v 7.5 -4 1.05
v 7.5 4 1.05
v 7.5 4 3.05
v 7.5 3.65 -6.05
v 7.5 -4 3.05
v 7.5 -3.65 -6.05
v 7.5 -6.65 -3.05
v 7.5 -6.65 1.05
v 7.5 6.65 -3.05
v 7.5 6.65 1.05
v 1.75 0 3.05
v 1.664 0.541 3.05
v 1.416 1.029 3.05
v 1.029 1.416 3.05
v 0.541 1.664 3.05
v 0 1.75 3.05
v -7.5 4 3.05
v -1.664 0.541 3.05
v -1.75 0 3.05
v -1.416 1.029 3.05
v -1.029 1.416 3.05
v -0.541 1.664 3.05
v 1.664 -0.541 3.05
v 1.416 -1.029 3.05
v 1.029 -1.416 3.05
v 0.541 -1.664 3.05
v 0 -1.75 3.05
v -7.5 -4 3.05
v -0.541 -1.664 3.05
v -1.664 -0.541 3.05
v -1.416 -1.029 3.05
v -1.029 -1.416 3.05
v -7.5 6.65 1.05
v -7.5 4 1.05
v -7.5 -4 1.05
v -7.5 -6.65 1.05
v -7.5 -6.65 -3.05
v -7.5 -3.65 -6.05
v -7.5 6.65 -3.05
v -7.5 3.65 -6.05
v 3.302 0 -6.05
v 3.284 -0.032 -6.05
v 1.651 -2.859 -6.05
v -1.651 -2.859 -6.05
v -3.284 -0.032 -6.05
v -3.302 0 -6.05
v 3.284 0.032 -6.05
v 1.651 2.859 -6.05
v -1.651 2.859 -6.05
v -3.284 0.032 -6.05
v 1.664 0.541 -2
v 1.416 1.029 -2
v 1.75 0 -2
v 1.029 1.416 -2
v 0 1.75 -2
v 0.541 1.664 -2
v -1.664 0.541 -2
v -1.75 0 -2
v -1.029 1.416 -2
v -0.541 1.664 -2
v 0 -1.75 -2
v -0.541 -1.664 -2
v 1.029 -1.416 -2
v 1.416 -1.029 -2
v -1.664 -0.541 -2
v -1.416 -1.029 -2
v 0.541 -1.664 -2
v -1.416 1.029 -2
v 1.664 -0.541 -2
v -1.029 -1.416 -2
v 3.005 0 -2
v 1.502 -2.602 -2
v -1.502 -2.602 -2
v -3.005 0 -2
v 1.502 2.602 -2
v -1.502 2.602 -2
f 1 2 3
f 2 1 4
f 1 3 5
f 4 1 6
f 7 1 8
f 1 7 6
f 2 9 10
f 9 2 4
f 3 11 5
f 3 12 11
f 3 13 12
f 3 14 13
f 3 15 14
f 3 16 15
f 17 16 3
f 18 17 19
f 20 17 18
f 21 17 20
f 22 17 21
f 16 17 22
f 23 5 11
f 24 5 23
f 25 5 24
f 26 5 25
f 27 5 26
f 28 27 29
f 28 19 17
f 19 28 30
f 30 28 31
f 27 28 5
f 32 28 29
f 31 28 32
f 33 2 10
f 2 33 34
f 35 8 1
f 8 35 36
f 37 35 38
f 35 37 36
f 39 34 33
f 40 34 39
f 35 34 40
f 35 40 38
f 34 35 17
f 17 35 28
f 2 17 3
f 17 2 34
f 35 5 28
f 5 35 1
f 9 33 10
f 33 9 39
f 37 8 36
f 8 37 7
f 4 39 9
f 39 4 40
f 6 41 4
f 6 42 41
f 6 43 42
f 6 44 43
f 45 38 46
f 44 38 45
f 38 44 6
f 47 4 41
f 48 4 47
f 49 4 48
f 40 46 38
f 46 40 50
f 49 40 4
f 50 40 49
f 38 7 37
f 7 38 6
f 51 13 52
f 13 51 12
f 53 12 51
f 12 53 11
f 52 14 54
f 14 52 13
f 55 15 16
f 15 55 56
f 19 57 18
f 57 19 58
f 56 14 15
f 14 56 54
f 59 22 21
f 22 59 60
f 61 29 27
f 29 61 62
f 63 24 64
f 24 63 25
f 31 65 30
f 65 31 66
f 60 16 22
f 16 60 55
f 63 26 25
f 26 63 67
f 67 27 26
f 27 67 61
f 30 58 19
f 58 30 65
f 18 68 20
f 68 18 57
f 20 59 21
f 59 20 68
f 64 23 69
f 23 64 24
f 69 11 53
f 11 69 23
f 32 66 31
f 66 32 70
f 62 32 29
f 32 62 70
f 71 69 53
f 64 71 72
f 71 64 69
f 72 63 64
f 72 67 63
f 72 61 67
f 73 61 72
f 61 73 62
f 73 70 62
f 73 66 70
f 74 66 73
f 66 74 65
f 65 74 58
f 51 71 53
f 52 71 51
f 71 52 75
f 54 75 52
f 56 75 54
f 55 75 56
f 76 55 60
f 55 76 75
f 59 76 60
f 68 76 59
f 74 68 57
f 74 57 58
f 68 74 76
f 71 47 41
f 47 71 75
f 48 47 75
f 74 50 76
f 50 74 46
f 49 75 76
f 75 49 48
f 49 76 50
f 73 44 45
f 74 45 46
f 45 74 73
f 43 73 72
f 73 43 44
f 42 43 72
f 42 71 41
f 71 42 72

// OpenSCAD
nut_size = 6.01;
bolt_d = 3.5;
top_width = 8;
top_height = 2;//2
width = 13.3;//13.5
height = 9.1;//9.5
length = 15;
bottom_edge_cut = 3;
nut_depth = 4;



module trapezoid(width_base, width_top, height, thickness, center = true) {
  linear_extrude(height = thickness) polygon(points=[[0,0],[width_base,0],[width_base-(width_base-width_top)/2,height],[(width_base-width_top)/2,height]], paths=[[0,1,2,3]]); 
  
}

module nut(){
difference(){
	union(){
		translate([0,0,(height - bottom_edge_cut - top_height)/2]) cube([length, top_width, top_height], true);
		translate([0,0,-top_height/2]) cube([length, width, height - bottom_edge_cut - top_height], true);
		translate([-length/2,-width/2 + bottom_edge_cut , -height/2- bottom_edge_cut/2]) rotate([90,0,90]) trapezoid(width - bottom_edge_cut*2, width, bottom_edge_cut, length);
	}
cylinder(center=true,$fn=20, d=bolt_d, h= height+bottom_edge_cut+0.1);
translate([0,0,-height/2-bottom_edge_cut/2 + nut_depth/2]) cylinder(center=true, $fn=6,d1=nut_size*1.1, d2=nut_size, h=nut_depth+0.1);
}
}
nut();
